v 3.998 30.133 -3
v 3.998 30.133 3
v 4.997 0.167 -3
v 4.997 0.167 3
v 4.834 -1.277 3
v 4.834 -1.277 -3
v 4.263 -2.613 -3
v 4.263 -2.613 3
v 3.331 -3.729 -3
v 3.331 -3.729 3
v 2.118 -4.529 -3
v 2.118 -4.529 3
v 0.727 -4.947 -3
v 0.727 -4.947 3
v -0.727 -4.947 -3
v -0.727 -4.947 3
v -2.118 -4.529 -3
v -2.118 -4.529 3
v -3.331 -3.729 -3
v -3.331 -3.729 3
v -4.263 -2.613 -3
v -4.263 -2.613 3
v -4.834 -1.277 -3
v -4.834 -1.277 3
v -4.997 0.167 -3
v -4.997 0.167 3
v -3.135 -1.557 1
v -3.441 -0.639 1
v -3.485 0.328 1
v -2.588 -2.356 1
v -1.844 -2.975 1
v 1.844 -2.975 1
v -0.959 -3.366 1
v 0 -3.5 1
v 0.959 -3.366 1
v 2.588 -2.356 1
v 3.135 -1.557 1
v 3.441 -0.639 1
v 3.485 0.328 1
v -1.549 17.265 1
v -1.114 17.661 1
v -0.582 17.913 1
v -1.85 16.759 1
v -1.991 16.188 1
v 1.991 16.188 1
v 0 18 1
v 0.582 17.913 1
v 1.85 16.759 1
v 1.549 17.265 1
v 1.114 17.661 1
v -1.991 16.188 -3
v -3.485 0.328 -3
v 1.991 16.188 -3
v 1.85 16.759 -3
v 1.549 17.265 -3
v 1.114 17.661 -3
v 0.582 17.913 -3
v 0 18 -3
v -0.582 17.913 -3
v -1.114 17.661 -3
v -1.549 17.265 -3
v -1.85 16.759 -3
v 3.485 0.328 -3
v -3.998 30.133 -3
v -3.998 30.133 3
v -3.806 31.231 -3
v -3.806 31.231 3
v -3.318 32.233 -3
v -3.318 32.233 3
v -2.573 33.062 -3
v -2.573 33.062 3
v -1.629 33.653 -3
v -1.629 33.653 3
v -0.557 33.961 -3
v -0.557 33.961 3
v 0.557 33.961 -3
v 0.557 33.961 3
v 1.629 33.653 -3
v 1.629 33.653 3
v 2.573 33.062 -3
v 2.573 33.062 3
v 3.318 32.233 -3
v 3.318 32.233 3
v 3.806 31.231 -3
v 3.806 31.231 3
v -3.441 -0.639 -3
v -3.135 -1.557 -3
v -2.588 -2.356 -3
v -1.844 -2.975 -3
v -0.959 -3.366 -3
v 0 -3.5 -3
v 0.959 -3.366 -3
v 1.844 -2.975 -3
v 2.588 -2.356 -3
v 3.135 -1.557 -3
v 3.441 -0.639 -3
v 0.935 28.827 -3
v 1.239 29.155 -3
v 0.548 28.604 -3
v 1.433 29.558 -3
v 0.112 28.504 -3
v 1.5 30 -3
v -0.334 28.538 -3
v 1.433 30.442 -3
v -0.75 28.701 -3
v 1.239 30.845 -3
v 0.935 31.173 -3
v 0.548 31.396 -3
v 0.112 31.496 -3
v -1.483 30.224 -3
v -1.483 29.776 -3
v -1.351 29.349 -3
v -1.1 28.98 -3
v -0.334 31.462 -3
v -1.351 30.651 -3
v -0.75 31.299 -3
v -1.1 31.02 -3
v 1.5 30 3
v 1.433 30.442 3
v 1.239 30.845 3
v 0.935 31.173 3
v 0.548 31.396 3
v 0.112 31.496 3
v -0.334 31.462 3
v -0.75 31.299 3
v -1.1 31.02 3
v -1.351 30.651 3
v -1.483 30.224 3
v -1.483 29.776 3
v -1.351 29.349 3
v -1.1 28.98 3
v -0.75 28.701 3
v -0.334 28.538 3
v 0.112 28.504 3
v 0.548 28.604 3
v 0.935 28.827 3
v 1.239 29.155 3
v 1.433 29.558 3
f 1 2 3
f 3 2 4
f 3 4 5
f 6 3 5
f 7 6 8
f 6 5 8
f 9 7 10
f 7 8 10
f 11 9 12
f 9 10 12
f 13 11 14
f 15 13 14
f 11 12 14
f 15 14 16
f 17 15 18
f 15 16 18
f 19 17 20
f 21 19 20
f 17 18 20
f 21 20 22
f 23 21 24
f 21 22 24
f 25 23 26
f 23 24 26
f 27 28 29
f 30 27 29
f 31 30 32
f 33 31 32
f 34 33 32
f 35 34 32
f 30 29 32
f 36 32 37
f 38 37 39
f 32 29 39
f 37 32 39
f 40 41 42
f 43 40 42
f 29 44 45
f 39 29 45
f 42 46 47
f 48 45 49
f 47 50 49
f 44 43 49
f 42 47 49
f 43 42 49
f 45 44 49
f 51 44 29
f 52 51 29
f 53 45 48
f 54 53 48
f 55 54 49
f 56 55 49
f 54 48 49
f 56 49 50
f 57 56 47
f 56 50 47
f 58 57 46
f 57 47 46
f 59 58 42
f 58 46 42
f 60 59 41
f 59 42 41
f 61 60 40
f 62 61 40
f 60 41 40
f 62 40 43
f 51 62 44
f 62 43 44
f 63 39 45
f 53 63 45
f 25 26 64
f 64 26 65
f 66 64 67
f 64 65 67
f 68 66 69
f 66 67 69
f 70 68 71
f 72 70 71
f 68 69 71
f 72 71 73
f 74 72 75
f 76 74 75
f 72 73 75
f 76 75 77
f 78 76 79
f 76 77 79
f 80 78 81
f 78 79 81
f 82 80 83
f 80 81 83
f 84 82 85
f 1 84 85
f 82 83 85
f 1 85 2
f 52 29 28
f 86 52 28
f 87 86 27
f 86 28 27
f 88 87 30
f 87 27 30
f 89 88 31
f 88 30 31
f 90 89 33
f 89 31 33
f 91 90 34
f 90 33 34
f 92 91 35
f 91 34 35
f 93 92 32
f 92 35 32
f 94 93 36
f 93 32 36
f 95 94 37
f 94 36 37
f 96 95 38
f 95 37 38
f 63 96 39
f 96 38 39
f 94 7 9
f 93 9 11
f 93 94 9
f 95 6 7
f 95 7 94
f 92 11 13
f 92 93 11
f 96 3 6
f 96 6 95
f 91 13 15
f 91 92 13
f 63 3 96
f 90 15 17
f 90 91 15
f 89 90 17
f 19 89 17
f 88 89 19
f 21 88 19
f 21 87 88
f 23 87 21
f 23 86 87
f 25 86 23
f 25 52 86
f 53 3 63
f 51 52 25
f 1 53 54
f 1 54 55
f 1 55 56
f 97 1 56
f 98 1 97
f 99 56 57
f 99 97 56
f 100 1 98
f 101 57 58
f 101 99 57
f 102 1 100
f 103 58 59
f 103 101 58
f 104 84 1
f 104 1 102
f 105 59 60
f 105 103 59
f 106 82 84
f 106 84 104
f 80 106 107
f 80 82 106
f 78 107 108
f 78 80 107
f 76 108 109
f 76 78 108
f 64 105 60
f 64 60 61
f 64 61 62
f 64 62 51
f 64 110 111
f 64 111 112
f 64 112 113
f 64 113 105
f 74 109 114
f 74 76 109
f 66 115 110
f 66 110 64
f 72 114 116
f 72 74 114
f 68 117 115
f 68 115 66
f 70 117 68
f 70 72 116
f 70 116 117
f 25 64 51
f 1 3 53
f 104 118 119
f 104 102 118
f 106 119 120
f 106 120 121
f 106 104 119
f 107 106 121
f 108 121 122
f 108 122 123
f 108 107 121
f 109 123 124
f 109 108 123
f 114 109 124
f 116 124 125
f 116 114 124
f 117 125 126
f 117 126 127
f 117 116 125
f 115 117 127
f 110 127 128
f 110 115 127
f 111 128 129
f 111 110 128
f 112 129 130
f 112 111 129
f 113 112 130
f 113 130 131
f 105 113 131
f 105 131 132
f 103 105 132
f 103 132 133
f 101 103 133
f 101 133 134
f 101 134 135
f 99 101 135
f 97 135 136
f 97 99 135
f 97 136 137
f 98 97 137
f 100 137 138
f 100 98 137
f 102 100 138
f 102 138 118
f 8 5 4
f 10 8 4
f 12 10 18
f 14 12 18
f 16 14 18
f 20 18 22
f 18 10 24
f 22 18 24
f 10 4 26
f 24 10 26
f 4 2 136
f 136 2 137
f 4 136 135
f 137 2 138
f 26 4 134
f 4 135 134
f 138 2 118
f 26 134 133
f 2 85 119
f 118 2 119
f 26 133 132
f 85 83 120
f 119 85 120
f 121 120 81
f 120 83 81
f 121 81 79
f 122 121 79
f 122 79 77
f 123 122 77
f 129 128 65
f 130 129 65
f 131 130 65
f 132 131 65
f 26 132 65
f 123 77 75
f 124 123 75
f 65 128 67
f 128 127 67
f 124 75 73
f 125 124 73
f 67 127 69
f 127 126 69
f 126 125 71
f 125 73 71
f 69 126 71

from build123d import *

# Parameters (mm, degrees)
SKETCH2_R               = 1.5
BOSS_EXTRUDE1_DEPTH     = 3
CUT_EXTRUDE1_DEPTH      = 1
CUT_EXTRUDE1_DEPTH_BACK = 4


with BuildPart() as part:
    # Sketch2 → Boss-Extrude1 (new body, symmetric)
    with BuildSketch(Plane.XY):
        with BuildLine():
            Line((-4.99722145, 0.166666667), (-3.99777716, 30.133333333))
            ThreePointArc((-3.99777716, 30.133333333), (0, 34), (3.99777716, 30.133333333))
            Line((3.99777716, 30.133333333), (4.99722145, 0.166666667))
            ThreePointArc((4.99722145, 0.166666667), (0, -5), (-4.99722145, 0.166666667))
        make_face()
        with Locations((0, 30)):
            Circle(SKETCH2_R, mode=Mode.SUBTRACT)
    extrude(amount=BOSS_EXTRUDE1_DEPTH, both=True)

    # Sketch1 → Cut-Extrude1 (cut, two sides)
    with BuildSketch(Plane.XY) as cut_extrude1_sk:
        with BuildLine():
            Line((-1.99119154, 16.1875), (-3.484585195, 0.328125))
            ThreePointArc((-3.484585195, 0.328125), (0, -3.5), (3.484585195, 0.328125))
            Line((3.484585195, 0.328125), (1.99119154, 16.1875))
            ThreePointArc((1.99119154, 16.1875), (0, 18), (-1.99119154, 16.1875))
        make_face()
    extrude(amount=CUT_EXTRUDE1_DEPTH, mode=Mode.SUBTRACT)
    extrude(cut_extrude1_sk.sketch, amount=-CUT_EXTRUDE1_DEPTH_BACK, mode=Mode.SUBTRACT)


solid = part.part
